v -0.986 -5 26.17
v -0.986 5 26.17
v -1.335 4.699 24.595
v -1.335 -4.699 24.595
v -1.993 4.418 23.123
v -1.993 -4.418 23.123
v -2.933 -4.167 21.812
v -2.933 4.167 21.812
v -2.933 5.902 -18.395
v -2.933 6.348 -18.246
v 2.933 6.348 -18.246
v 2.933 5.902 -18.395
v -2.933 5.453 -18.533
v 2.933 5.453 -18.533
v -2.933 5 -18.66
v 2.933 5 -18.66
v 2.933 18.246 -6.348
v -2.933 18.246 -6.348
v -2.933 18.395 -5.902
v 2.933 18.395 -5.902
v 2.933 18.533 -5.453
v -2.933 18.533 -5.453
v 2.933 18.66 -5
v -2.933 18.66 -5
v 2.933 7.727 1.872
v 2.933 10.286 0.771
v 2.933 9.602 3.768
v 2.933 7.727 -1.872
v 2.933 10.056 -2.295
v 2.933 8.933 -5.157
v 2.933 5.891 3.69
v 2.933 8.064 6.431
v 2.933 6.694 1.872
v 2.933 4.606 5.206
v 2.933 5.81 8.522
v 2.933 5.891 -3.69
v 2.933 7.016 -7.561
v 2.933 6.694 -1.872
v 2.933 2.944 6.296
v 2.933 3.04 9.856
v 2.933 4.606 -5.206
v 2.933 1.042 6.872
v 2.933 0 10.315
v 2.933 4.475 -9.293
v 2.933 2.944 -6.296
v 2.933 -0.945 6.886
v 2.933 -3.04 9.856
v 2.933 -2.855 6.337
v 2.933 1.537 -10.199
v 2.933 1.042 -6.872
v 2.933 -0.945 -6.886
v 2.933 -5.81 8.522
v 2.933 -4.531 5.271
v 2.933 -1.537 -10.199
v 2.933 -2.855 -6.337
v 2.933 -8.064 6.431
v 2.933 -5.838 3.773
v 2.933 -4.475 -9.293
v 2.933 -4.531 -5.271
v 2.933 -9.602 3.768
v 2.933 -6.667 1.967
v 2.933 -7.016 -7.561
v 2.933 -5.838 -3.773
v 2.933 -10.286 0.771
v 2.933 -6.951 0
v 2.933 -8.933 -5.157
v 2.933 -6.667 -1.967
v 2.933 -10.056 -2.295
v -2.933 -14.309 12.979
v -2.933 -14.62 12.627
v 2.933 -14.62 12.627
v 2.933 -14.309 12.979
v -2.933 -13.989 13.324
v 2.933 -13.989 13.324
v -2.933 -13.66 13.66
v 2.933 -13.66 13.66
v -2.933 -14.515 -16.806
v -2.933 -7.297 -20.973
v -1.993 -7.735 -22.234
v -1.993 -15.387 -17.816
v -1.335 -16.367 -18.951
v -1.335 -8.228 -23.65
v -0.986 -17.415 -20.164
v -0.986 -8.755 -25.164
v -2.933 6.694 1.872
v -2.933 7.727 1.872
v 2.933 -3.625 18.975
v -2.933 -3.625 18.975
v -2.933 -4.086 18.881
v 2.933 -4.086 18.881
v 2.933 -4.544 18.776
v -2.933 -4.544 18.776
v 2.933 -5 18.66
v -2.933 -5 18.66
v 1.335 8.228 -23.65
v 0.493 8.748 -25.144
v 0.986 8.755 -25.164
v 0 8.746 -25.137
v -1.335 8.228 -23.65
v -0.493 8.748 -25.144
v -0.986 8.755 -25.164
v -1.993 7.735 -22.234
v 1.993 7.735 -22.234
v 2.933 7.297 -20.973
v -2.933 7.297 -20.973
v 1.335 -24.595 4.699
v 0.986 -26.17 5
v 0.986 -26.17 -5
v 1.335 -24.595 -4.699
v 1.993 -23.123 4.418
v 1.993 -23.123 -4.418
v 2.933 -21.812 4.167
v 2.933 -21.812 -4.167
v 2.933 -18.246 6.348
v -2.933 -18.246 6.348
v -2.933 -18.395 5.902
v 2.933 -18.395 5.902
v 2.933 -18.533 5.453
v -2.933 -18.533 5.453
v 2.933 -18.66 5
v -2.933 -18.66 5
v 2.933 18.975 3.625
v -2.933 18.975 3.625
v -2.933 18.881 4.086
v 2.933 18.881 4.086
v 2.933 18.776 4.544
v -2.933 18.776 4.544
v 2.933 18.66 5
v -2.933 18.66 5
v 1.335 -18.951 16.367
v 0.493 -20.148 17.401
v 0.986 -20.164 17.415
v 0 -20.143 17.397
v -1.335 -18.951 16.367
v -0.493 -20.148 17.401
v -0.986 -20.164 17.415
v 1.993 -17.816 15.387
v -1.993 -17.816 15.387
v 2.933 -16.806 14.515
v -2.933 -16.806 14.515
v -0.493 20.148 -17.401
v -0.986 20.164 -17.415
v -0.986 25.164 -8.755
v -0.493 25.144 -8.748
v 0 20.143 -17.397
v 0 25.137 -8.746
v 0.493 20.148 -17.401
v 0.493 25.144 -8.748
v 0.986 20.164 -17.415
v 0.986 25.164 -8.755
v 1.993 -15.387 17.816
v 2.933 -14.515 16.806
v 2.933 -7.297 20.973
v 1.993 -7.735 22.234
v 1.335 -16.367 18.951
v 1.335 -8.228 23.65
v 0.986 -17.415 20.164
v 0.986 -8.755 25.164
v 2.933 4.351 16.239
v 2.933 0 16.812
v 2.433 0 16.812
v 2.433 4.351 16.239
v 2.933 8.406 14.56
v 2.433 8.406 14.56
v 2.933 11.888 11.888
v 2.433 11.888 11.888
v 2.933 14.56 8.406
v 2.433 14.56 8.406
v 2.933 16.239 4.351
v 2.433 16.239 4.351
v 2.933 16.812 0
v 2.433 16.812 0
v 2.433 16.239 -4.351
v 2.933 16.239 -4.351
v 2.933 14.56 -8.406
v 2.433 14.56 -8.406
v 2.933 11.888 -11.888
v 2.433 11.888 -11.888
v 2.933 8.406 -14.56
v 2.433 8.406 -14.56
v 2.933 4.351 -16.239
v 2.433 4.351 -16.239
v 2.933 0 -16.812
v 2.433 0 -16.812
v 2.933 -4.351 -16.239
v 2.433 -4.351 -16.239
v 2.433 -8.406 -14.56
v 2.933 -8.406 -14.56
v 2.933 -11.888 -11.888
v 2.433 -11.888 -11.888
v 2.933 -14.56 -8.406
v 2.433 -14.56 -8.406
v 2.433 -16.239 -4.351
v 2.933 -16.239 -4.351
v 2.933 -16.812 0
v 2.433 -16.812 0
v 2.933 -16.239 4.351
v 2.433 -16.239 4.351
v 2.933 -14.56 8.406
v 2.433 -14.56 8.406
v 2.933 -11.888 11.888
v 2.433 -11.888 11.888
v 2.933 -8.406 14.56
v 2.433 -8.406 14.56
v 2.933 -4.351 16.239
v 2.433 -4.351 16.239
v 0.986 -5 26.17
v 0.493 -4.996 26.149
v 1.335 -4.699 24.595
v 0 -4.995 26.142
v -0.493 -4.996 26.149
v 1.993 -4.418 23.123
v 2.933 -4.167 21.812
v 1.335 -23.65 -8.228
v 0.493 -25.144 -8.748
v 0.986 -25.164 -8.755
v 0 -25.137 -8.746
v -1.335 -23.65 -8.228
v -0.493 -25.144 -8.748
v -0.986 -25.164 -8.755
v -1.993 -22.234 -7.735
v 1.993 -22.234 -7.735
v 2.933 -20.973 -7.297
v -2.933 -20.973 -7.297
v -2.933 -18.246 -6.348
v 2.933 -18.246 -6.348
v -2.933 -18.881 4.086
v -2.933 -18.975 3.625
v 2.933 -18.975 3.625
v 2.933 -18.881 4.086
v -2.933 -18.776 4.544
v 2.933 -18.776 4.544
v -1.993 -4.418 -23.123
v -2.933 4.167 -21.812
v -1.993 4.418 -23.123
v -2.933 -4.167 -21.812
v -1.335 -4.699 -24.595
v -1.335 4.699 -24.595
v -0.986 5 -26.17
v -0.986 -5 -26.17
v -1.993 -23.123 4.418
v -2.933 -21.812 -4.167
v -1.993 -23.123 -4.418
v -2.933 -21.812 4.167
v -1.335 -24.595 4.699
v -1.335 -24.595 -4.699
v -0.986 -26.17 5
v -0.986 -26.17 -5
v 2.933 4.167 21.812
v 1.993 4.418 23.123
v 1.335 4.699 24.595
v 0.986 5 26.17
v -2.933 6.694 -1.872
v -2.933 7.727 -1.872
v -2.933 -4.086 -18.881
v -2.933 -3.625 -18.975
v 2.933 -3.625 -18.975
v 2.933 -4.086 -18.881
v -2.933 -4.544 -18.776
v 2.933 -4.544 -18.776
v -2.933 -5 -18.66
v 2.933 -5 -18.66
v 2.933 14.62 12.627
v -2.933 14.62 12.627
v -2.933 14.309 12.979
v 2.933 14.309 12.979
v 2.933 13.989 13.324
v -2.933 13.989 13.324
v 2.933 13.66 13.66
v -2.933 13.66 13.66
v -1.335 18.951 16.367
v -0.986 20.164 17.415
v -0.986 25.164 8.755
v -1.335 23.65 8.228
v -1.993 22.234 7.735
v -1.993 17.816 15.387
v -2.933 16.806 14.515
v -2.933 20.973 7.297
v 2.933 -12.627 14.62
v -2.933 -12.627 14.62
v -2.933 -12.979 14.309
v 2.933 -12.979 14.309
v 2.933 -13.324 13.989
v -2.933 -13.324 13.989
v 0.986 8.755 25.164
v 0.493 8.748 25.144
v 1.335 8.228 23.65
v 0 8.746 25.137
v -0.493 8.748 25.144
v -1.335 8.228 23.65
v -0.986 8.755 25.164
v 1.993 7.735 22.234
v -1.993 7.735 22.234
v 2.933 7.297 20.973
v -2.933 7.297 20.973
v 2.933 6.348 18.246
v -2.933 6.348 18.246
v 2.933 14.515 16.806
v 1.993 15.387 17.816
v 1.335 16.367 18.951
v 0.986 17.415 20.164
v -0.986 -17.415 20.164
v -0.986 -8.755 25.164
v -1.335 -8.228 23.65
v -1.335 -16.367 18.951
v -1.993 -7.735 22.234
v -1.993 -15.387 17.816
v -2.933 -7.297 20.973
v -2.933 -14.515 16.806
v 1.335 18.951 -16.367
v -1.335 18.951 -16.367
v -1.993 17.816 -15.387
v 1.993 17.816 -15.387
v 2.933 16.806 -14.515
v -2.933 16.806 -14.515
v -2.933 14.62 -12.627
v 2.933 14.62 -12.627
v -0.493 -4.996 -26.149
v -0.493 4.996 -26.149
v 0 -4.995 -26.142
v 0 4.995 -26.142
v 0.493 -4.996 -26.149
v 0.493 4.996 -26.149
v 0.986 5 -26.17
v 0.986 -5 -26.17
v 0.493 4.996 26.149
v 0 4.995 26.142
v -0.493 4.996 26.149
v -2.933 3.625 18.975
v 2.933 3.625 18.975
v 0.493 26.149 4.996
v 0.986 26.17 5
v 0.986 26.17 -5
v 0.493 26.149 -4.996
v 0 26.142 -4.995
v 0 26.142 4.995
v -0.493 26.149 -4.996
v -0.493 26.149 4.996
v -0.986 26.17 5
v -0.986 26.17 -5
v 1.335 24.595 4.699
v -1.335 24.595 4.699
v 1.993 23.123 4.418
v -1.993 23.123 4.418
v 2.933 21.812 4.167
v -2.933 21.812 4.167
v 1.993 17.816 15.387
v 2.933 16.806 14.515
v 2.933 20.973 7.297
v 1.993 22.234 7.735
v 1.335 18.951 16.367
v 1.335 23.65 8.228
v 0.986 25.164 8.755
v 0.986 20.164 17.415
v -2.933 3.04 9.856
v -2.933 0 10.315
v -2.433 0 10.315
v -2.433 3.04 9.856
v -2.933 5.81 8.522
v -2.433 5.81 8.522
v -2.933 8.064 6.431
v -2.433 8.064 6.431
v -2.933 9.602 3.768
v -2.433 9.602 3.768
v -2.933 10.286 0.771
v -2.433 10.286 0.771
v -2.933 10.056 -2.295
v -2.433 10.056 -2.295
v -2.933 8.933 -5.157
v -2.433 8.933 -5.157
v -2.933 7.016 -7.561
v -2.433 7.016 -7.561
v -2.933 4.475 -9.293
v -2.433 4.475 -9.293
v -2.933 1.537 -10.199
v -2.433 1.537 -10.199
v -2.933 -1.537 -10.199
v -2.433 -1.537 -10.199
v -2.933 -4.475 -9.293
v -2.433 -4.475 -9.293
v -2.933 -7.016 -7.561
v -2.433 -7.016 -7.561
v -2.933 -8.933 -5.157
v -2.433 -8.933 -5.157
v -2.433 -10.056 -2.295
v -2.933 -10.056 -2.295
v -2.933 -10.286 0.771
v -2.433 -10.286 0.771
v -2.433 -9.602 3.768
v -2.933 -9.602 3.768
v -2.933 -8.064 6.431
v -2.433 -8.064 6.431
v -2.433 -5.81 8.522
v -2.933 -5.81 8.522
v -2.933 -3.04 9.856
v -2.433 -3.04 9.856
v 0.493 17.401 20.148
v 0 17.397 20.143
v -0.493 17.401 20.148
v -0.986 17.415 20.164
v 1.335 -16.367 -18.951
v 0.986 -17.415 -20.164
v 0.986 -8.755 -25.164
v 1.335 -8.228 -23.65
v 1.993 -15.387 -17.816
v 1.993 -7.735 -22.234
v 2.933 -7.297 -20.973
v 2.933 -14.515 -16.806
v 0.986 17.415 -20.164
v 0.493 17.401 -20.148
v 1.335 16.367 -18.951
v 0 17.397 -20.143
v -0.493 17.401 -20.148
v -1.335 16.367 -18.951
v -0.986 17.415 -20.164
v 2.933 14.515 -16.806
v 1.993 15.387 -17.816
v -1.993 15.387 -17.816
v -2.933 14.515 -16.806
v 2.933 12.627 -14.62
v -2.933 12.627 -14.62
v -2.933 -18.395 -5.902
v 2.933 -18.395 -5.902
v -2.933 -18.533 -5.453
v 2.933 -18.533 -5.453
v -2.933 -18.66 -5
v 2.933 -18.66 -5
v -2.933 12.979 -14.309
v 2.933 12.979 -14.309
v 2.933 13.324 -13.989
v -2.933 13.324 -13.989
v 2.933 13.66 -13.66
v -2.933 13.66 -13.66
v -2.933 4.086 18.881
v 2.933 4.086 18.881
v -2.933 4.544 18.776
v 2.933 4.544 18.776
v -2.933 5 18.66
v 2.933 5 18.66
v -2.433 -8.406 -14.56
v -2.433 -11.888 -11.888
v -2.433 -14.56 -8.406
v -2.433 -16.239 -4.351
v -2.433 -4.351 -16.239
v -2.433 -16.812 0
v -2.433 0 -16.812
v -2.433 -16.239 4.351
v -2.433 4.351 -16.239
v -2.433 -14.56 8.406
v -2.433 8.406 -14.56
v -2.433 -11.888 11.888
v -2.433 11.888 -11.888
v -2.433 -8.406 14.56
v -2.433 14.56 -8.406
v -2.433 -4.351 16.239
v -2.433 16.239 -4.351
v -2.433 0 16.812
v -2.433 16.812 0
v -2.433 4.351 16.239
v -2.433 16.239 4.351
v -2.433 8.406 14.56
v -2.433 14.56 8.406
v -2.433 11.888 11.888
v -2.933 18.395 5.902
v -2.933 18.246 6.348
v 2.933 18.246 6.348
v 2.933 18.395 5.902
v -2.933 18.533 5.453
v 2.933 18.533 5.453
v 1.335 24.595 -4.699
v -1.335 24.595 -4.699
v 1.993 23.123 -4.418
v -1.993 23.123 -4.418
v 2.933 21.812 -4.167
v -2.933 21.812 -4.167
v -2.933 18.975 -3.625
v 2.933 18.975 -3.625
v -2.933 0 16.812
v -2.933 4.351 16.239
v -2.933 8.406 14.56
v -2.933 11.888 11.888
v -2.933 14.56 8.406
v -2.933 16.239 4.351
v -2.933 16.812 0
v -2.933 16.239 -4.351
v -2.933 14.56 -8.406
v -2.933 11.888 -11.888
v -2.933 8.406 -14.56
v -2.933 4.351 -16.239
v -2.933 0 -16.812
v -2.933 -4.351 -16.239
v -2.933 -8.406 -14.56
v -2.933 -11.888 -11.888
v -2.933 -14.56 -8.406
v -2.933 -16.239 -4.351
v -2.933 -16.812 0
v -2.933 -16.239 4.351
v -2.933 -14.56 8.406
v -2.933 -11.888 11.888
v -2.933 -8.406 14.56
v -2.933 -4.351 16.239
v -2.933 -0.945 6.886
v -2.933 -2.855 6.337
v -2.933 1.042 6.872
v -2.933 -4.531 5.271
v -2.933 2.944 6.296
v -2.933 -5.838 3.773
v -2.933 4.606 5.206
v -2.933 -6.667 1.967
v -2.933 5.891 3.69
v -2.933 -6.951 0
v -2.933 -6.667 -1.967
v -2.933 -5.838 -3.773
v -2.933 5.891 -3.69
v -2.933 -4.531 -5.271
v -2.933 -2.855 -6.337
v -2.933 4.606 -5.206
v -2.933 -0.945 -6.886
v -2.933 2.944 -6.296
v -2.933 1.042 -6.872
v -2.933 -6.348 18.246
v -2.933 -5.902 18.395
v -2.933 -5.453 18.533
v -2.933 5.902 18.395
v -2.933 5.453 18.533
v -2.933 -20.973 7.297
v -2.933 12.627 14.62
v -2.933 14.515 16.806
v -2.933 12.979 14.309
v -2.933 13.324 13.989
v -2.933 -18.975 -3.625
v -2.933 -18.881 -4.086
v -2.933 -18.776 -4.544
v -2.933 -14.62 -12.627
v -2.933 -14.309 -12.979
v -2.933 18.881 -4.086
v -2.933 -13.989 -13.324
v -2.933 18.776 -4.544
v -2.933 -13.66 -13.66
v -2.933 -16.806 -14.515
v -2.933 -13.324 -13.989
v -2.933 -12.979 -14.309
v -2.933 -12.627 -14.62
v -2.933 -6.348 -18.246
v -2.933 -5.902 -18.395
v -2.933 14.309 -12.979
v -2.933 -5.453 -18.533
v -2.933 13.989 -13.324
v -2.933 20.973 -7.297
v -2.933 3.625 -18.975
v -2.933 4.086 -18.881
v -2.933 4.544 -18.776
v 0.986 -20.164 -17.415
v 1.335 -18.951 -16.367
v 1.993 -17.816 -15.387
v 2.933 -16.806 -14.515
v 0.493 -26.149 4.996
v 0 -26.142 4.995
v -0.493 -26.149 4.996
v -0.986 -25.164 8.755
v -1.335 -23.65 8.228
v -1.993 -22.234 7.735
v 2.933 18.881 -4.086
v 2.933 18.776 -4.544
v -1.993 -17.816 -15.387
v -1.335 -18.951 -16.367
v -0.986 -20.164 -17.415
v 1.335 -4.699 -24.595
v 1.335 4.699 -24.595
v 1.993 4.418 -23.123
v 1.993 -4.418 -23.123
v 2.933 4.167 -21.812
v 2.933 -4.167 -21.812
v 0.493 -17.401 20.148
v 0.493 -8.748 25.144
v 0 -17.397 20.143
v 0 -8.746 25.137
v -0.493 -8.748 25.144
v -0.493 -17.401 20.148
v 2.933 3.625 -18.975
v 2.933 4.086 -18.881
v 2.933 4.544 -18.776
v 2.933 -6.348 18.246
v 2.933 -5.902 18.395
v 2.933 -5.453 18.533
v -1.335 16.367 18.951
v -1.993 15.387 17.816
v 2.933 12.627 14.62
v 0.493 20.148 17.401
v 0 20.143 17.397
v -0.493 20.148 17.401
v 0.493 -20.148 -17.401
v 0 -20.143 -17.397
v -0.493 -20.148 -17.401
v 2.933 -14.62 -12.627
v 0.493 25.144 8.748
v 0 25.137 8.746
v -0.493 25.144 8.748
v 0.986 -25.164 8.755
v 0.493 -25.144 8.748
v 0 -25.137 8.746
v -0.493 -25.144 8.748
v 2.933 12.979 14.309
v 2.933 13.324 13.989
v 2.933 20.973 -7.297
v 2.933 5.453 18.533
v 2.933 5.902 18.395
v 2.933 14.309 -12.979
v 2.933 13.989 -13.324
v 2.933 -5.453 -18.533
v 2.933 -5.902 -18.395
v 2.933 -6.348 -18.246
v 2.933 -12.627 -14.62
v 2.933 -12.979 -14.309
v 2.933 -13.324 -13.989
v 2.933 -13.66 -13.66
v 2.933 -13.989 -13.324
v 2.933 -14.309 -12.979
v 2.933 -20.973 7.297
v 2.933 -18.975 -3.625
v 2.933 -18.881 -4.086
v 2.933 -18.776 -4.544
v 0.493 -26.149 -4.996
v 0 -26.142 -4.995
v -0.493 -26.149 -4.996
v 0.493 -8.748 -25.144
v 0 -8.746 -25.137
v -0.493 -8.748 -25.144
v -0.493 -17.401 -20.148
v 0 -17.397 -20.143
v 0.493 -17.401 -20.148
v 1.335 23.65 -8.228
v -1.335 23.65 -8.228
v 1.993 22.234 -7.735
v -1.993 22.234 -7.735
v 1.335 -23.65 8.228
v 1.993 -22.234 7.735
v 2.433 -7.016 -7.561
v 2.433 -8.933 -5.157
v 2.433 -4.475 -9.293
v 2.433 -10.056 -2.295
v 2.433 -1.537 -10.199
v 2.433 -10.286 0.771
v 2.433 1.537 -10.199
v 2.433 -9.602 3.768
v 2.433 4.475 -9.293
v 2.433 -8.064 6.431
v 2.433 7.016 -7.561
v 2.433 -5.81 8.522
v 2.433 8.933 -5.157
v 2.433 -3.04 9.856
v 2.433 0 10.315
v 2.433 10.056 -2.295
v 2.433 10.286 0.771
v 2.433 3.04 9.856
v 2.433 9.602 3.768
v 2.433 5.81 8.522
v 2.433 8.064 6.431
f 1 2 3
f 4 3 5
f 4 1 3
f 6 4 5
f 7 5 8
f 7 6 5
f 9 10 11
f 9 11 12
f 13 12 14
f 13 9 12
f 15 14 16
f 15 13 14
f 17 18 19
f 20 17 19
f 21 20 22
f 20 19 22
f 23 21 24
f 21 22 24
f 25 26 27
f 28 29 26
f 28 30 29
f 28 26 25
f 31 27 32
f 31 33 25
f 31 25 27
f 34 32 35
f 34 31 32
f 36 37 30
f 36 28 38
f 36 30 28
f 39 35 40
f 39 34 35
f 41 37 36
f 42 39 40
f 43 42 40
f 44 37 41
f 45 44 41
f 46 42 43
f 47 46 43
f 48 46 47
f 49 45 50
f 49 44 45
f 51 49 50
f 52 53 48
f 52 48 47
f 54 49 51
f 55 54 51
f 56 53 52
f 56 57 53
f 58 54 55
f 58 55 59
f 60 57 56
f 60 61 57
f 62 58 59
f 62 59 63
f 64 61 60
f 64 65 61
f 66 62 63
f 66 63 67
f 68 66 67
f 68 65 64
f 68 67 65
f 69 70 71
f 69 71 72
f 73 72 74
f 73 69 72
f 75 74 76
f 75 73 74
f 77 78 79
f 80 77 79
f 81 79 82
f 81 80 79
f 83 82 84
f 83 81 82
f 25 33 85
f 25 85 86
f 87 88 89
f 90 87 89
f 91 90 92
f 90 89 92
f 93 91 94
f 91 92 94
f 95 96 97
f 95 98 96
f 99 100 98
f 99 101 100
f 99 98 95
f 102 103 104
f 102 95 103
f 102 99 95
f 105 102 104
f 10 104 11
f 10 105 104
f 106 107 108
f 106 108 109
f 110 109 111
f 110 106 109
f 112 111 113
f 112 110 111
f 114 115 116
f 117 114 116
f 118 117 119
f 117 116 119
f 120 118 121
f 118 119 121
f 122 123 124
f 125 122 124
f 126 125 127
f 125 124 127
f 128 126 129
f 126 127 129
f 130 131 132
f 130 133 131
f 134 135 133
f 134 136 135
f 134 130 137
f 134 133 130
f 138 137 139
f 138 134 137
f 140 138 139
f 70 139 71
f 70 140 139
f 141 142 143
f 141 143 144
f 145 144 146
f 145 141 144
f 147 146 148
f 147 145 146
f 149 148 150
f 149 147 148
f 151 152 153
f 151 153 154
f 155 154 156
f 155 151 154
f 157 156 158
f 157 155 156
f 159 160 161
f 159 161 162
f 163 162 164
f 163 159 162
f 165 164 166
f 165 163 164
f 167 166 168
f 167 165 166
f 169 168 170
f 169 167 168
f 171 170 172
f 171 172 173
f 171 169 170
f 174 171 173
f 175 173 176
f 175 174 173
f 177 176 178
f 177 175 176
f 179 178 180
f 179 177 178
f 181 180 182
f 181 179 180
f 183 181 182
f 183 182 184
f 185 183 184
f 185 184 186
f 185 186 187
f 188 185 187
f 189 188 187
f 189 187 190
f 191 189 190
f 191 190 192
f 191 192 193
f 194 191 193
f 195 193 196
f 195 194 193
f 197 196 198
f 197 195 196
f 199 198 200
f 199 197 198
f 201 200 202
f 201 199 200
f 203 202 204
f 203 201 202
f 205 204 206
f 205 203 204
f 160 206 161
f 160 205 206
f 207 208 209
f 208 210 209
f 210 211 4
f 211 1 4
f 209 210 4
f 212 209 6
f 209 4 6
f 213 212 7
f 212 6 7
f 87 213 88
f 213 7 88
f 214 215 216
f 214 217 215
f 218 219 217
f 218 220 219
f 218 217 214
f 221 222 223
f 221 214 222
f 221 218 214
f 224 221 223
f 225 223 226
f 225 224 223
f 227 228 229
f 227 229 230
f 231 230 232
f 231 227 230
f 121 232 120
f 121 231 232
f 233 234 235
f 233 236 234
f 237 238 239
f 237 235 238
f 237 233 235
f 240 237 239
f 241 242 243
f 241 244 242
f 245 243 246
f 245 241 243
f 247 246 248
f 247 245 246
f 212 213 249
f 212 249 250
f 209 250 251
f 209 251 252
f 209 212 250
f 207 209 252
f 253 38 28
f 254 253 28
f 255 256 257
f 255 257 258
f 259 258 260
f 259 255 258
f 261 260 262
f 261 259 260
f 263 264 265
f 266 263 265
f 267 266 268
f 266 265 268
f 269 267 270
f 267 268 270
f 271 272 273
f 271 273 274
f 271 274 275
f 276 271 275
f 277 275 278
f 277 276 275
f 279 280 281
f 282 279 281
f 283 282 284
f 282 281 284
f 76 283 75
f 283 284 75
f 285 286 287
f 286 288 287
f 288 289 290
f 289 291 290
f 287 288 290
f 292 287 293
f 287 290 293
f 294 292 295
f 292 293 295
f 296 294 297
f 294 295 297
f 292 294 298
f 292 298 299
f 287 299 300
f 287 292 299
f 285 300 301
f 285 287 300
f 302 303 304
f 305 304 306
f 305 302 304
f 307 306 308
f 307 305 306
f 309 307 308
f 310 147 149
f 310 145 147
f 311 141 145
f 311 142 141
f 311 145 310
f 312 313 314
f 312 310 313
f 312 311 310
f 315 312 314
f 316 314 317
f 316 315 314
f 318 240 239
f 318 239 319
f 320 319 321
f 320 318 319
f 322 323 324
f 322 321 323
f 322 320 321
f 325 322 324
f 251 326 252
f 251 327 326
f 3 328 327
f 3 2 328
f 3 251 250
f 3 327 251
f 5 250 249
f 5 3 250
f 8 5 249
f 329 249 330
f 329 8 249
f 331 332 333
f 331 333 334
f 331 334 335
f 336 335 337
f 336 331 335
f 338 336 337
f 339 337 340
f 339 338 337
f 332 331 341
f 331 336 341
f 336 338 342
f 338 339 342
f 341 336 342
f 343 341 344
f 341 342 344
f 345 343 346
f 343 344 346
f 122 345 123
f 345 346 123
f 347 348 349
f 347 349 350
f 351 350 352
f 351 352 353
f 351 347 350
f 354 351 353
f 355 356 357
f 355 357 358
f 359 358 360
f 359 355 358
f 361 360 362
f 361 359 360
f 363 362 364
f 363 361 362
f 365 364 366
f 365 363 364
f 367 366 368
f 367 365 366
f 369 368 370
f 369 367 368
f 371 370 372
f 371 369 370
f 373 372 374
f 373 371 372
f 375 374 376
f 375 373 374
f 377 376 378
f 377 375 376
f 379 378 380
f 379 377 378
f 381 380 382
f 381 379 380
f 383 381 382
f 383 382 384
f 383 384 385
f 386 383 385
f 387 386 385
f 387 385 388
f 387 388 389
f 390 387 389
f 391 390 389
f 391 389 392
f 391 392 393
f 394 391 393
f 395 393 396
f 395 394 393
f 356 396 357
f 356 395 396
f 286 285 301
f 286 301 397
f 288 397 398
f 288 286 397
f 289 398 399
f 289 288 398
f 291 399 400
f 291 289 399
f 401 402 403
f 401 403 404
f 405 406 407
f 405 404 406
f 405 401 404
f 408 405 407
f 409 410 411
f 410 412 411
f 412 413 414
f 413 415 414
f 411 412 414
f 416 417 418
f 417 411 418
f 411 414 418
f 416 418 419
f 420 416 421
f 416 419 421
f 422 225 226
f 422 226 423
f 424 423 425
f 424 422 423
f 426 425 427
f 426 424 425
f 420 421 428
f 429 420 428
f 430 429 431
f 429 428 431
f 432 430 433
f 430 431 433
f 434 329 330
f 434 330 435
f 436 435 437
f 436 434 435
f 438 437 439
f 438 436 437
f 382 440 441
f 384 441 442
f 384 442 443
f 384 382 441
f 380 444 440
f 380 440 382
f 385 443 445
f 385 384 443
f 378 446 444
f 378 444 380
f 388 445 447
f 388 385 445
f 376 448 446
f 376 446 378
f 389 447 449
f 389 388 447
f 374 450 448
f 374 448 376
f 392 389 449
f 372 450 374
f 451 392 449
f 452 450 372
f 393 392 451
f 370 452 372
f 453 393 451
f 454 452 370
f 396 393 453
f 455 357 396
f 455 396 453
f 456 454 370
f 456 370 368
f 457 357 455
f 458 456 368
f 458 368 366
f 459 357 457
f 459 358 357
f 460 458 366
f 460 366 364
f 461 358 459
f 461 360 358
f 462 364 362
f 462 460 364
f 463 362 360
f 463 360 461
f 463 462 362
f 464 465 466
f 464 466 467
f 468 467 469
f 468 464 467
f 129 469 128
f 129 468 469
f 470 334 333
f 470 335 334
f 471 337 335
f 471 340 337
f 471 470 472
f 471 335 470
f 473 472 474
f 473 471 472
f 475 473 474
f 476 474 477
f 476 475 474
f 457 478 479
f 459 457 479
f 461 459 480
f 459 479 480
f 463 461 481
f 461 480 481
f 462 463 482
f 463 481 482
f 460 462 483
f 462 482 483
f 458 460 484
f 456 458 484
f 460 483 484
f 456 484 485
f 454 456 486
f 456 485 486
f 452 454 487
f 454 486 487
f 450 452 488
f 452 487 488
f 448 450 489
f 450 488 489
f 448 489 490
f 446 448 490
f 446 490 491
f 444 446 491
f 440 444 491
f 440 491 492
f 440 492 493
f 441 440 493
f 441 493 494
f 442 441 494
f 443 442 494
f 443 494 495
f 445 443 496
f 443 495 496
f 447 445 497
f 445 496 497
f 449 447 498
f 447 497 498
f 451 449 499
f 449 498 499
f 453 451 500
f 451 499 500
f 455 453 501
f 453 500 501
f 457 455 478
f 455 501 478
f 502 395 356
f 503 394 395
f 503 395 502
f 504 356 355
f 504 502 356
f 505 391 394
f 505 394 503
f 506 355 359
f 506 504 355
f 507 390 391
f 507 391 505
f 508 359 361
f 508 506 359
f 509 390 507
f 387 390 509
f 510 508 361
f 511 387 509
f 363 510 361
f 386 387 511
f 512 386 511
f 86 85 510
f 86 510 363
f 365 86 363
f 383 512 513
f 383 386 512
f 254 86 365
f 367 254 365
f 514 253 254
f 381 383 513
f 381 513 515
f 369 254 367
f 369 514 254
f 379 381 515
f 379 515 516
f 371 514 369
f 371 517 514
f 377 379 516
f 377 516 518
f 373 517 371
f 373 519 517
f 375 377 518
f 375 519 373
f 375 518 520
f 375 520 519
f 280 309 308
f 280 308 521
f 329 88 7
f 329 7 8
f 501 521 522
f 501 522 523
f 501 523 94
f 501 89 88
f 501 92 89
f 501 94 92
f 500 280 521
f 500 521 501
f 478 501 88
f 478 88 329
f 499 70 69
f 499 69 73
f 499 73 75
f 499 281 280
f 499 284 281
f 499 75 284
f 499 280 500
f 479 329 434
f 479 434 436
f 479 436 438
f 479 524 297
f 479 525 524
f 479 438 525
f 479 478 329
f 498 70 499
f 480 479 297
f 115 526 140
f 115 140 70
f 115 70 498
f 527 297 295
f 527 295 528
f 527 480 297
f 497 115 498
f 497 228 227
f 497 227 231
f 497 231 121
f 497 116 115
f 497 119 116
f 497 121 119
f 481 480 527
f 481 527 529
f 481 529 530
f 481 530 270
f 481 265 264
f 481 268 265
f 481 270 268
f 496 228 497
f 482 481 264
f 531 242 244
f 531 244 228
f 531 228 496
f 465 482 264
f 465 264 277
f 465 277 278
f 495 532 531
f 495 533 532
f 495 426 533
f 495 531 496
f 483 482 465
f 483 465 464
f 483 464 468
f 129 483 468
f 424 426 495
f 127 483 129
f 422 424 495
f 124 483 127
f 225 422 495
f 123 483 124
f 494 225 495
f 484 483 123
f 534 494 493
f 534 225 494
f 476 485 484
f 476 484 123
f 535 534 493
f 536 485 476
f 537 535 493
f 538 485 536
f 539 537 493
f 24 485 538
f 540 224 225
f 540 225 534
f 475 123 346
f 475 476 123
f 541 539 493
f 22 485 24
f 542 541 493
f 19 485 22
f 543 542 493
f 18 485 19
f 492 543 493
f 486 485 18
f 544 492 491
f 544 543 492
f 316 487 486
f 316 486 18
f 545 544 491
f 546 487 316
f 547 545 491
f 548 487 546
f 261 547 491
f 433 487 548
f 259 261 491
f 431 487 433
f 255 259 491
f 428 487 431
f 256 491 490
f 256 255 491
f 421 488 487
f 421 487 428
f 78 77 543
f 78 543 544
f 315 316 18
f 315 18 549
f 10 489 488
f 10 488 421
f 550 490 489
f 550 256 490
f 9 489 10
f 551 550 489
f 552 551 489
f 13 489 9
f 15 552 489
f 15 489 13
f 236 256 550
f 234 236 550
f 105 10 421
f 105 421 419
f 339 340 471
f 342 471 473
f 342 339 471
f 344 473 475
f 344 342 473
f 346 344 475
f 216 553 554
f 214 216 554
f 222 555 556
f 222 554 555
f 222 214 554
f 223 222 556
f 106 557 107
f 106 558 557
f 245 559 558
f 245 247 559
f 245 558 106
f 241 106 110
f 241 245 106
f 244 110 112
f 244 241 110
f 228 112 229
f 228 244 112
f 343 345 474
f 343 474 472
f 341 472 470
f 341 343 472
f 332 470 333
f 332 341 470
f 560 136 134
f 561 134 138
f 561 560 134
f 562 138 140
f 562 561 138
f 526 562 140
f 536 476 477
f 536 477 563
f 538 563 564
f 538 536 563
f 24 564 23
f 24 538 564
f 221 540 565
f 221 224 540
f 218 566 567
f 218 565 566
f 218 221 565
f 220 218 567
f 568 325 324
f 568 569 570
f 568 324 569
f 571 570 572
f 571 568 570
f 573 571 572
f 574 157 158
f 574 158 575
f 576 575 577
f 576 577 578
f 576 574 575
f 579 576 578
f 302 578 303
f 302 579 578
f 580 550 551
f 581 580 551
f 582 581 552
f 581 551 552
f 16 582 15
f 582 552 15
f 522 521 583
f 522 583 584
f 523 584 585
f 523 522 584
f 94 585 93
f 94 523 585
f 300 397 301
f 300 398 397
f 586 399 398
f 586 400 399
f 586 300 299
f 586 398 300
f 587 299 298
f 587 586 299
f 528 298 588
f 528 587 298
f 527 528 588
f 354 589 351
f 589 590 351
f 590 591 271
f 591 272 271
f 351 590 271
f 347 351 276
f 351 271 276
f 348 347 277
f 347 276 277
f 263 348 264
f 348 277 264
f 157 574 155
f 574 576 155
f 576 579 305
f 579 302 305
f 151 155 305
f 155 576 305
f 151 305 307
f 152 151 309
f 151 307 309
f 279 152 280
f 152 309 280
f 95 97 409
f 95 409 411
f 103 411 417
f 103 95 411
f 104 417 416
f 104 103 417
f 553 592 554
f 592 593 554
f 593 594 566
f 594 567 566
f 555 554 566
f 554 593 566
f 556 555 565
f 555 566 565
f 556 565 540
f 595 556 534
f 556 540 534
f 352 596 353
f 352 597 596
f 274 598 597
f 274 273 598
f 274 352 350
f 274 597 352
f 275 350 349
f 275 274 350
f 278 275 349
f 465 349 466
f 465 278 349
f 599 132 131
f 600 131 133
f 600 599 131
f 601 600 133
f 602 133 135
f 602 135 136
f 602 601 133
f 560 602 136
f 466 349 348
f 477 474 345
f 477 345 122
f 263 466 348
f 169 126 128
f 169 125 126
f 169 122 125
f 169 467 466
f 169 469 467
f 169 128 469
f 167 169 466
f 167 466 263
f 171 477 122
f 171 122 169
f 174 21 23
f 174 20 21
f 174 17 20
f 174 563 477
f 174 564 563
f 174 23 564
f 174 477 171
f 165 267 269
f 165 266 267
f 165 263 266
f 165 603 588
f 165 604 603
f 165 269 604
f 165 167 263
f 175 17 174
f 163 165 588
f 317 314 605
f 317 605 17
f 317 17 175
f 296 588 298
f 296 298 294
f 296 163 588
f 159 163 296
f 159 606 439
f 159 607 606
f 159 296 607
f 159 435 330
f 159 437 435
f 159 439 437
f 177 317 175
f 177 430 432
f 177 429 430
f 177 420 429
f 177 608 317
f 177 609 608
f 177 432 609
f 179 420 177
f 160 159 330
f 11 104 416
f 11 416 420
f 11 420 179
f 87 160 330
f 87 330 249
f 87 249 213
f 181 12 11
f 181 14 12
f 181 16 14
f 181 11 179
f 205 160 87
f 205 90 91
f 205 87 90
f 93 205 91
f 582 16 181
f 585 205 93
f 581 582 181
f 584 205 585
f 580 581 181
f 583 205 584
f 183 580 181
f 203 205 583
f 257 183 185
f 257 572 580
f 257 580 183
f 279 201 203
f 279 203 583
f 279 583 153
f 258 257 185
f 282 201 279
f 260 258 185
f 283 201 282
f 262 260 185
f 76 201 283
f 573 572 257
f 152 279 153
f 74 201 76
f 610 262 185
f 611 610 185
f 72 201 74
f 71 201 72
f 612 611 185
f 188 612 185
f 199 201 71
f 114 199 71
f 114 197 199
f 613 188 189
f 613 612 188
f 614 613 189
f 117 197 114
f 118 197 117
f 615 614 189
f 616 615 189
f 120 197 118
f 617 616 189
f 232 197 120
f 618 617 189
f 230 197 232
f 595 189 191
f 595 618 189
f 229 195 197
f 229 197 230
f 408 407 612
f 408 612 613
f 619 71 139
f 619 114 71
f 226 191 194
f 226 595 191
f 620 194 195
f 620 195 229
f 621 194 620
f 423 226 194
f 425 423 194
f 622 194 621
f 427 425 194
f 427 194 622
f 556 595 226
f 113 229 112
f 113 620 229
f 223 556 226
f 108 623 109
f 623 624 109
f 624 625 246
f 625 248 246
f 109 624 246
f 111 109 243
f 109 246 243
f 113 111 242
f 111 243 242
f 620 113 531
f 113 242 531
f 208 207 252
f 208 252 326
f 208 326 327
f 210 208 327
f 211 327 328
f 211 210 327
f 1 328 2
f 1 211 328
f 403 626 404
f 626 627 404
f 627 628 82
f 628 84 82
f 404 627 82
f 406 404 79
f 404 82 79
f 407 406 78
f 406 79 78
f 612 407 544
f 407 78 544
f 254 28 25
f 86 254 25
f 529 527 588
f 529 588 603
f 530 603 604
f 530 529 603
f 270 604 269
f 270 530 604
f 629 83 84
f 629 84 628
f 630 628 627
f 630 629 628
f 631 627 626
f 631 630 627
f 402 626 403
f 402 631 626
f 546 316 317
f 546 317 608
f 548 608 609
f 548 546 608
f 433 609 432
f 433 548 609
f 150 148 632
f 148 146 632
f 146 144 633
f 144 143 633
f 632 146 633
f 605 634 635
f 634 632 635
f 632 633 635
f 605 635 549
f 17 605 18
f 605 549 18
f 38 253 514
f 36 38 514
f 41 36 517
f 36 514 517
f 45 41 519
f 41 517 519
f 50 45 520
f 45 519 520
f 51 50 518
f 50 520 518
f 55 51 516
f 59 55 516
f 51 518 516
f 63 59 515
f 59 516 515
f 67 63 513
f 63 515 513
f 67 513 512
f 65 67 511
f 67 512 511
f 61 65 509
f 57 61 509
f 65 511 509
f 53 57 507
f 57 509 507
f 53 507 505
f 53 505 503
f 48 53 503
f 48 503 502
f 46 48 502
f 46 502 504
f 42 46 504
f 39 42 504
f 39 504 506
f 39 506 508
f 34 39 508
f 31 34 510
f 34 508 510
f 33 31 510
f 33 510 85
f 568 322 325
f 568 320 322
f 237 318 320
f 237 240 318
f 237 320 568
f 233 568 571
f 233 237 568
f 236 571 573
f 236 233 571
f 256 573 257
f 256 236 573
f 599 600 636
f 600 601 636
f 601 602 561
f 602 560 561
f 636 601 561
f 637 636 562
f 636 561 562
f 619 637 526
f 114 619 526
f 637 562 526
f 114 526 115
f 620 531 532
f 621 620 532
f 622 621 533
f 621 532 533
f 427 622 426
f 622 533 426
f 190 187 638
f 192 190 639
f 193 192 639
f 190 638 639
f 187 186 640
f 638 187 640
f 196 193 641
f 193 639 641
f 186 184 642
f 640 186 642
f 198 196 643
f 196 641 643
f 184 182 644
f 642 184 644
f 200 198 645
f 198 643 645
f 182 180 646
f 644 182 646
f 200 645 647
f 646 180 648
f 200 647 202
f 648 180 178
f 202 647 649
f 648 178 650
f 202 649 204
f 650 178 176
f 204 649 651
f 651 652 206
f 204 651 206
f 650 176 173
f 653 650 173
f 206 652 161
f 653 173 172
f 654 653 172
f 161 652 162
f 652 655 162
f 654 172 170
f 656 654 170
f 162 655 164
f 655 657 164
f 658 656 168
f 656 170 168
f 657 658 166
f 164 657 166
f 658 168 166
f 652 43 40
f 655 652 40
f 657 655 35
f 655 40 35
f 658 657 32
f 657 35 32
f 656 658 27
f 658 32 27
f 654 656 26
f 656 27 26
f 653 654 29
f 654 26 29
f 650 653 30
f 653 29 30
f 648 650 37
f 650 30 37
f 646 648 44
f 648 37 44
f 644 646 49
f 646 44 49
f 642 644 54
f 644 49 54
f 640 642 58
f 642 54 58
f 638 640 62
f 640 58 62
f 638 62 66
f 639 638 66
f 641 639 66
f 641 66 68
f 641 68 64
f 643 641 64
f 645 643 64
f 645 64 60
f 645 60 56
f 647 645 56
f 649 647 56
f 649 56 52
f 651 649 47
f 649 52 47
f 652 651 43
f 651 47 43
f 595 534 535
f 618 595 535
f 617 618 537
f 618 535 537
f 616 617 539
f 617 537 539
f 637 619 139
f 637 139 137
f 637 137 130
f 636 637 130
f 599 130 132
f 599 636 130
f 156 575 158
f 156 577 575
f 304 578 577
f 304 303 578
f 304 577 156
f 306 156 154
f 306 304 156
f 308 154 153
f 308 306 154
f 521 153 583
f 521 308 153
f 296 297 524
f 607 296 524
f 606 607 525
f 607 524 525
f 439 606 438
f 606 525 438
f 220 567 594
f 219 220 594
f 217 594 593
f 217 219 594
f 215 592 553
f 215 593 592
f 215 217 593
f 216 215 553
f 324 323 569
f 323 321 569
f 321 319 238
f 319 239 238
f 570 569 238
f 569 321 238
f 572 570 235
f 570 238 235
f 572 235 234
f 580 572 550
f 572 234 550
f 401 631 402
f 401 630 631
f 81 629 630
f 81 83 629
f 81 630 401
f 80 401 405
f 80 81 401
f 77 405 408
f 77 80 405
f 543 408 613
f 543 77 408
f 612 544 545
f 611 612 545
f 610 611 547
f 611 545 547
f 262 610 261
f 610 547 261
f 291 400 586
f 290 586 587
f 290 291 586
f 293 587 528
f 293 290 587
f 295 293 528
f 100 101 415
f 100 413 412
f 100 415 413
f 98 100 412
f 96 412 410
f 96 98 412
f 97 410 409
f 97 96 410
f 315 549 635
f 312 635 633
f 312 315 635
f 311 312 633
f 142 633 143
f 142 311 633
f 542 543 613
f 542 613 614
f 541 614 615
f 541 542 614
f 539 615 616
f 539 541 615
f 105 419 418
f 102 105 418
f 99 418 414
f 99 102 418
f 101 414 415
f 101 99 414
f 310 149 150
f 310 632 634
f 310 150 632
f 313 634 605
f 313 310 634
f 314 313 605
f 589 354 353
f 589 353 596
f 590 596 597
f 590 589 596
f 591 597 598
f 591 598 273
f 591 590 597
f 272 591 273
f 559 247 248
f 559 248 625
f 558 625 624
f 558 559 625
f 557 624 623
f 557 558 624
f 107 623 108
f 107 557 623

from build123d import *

# Parameters (mm, degrees)
BOSS_EXTRUDE1_DEPTH     = 5
CIRPATTERN1_COUNT       = 12
SKETCH4_R               = 16.811989879
SKETCH4_R_2             = 10.314619087
CUT_EXTRUDE1_DEPTH      = 0.5
SKETCH5_R               = 6.950731161
CUT_EXTRUDE2_DEPTH      = 46.5
CUT_EXTRUDE3_DEPTH      = 46.5
CIRPATTERN2_COUNT       = 12
CUT_EXTRUDE4_DEPTH      = 46.5
CUT_EXTRUDE4_DEPTH_BACK = 46.5
SKETCH10_W              = 3.744348286
SKETCH10_H              = 1.553508974


with BuildPart() as part:
    # Sketch1 → Boss-Extrude1 (new, symmetric)
    with BuildSketch(Plane.XY):
        with BuildLine():
            ThreePointArc((-0.986171591, 26.170075379), (-1.626916196, 23.842475136), (-2.932850173, 21.812004013))
            Line((-2.932850173, 21.812004013), (-2.932850173, -21.812004013))
            ThreePointArc((-2.932850173, -21.812004013), (-1.626916196, -23.842475136), (-0.986171591, -26.170075379))
            ThreePointArc((-0.986171591, -26.170075379), (0, -26.142264995), (0.986171591, -26.170075379))
            ThreePointArc((0.986171591, -26.170075379), (1.626916196, -23.842475136), (2.932850173, -21.812004013))
            Line((2.932850173, -21.812004013), (2.932850173, 21.812004013))
            ThreePointArc((2.932850173, 21.812004013), (1.626916196, 23.842475136), (0.986171591, 26.170075379))
            ThreePointArc((0.986171591, 26.170075379), (0, 26.142264995), (-0.986171591, 26.170075379))
        make_face()
    boss_extrude1 = extrude(amount=BOSS_EXTRUDE1_DEPTH, both=True)

    # CirPattern1: Boss-Extrude1 ×12 about axis
    cirpattern1_axis = Axis((-1000, 0, 0), (1, 0, 0))
    for i in range(1, CIRPATTERN1_COUNT):
        add(boss_extrude1.rotate(cirpattern1_axis, i * 360 / CIRPATTERN1_COUNT))

    # Sketch4 → Cut-Extrude1 (cut)
    with BuildSketch(Plane.ZY.offset(2.932850173)):
        Circle(SKETCH4_R)
        Circle(SKETCH4_R_2, mode=Mode.SUBTRACT)
    cut_extrude1 = extrude(amount=-CUT_EXTRUDE1_DEPTH, mode=Mode.SUBTRACT)

    # Sketch5 → Cut-Extrude2 (cut)
    with BuildSketch(Plane.ZY.offset(2.932850173)):
        Circle(SKETCH5_R)
    cut_extrude2 = extrude(amount=-CUT_EXTRUDE2_DEPTH, mode=Mode.SUBTRACT)

    # Sketch6 → Cut-Extrude3 (cut)
    with BuildSketch(Plane.ZY.offset(2.932850173)):
        with BuildLine():
            Line((-26.170075379, -5), (-18.975291906, -3.625379681))
            ThreePointArc((-18.975291906, -3.625379681), (-18.830320626, -4.315565534), (-18.660254038, -5))
            Line((-18.660254038, -5), (-26.170075379, -5))
        make_face()
        with BuildLine():
            Line((-26.170075379, 5), (-18.975291906, 3.625379681))
            ThreePointArc((-18.975291906, 3.625379681), (-18.830320626, 4.315565534), (-18.660254038, 5))
            Line((-18.660254038, 5), (-26.170075379, 5))
        make_face()
    cut_extrude3 = extrude(amount=-CUT_EXTRUDE3_DEPTH, mode=Mode.SUBTRACT)

    # CirPattern2: Cut-Extrude3 ×12 about axis
    cirpattern2_axis = Axis((-1000, 0, 0), (1, 0, 0))
    for i in range(1, CIRPATTERN2_COUNT):
        add(cut_extrude3.rotate(cirpattern2_axis, i * 360 / CIRPATTERN2_COUNT), mode=Mode.SUBTRACT)

    # Sketch10 → Cut-Extrude4 (cut, two sides: drawn at the far end of the back side and taken through both)
    with BuildSketch(Plane.ZY.offset(2.432850173).offset(-CUT_EXTRUDE4_DEPTH_BACK)):
        with Locations((0, 6.950731161)):
            Rectangle(SKETCH10_W, SKETCH10_H)
    extrude(amount=CUT_EXTRUDE4_DEPTH + CUT_EXTRUDE4_DEPTH_BACK, mode=Mode.SUBTRACT)

    # Mirror3: Cut-Extrude1, Cut-Extrude2 across plane
    add(cut_extrude1.mirror(Plane(origin=(0, 0, 0), x_dir=(0, 0, 1), z_dir=(1, 0, 0))), mode=Mode.SUBTRACT)
    add(cut_extrude2.mirror(Plane(origin=(0, 0, 0), x_dir=(0, 0, 1), z_dir=(1, 0, 0))), mode=Mode.SUBTRACT)


solid = part.part
